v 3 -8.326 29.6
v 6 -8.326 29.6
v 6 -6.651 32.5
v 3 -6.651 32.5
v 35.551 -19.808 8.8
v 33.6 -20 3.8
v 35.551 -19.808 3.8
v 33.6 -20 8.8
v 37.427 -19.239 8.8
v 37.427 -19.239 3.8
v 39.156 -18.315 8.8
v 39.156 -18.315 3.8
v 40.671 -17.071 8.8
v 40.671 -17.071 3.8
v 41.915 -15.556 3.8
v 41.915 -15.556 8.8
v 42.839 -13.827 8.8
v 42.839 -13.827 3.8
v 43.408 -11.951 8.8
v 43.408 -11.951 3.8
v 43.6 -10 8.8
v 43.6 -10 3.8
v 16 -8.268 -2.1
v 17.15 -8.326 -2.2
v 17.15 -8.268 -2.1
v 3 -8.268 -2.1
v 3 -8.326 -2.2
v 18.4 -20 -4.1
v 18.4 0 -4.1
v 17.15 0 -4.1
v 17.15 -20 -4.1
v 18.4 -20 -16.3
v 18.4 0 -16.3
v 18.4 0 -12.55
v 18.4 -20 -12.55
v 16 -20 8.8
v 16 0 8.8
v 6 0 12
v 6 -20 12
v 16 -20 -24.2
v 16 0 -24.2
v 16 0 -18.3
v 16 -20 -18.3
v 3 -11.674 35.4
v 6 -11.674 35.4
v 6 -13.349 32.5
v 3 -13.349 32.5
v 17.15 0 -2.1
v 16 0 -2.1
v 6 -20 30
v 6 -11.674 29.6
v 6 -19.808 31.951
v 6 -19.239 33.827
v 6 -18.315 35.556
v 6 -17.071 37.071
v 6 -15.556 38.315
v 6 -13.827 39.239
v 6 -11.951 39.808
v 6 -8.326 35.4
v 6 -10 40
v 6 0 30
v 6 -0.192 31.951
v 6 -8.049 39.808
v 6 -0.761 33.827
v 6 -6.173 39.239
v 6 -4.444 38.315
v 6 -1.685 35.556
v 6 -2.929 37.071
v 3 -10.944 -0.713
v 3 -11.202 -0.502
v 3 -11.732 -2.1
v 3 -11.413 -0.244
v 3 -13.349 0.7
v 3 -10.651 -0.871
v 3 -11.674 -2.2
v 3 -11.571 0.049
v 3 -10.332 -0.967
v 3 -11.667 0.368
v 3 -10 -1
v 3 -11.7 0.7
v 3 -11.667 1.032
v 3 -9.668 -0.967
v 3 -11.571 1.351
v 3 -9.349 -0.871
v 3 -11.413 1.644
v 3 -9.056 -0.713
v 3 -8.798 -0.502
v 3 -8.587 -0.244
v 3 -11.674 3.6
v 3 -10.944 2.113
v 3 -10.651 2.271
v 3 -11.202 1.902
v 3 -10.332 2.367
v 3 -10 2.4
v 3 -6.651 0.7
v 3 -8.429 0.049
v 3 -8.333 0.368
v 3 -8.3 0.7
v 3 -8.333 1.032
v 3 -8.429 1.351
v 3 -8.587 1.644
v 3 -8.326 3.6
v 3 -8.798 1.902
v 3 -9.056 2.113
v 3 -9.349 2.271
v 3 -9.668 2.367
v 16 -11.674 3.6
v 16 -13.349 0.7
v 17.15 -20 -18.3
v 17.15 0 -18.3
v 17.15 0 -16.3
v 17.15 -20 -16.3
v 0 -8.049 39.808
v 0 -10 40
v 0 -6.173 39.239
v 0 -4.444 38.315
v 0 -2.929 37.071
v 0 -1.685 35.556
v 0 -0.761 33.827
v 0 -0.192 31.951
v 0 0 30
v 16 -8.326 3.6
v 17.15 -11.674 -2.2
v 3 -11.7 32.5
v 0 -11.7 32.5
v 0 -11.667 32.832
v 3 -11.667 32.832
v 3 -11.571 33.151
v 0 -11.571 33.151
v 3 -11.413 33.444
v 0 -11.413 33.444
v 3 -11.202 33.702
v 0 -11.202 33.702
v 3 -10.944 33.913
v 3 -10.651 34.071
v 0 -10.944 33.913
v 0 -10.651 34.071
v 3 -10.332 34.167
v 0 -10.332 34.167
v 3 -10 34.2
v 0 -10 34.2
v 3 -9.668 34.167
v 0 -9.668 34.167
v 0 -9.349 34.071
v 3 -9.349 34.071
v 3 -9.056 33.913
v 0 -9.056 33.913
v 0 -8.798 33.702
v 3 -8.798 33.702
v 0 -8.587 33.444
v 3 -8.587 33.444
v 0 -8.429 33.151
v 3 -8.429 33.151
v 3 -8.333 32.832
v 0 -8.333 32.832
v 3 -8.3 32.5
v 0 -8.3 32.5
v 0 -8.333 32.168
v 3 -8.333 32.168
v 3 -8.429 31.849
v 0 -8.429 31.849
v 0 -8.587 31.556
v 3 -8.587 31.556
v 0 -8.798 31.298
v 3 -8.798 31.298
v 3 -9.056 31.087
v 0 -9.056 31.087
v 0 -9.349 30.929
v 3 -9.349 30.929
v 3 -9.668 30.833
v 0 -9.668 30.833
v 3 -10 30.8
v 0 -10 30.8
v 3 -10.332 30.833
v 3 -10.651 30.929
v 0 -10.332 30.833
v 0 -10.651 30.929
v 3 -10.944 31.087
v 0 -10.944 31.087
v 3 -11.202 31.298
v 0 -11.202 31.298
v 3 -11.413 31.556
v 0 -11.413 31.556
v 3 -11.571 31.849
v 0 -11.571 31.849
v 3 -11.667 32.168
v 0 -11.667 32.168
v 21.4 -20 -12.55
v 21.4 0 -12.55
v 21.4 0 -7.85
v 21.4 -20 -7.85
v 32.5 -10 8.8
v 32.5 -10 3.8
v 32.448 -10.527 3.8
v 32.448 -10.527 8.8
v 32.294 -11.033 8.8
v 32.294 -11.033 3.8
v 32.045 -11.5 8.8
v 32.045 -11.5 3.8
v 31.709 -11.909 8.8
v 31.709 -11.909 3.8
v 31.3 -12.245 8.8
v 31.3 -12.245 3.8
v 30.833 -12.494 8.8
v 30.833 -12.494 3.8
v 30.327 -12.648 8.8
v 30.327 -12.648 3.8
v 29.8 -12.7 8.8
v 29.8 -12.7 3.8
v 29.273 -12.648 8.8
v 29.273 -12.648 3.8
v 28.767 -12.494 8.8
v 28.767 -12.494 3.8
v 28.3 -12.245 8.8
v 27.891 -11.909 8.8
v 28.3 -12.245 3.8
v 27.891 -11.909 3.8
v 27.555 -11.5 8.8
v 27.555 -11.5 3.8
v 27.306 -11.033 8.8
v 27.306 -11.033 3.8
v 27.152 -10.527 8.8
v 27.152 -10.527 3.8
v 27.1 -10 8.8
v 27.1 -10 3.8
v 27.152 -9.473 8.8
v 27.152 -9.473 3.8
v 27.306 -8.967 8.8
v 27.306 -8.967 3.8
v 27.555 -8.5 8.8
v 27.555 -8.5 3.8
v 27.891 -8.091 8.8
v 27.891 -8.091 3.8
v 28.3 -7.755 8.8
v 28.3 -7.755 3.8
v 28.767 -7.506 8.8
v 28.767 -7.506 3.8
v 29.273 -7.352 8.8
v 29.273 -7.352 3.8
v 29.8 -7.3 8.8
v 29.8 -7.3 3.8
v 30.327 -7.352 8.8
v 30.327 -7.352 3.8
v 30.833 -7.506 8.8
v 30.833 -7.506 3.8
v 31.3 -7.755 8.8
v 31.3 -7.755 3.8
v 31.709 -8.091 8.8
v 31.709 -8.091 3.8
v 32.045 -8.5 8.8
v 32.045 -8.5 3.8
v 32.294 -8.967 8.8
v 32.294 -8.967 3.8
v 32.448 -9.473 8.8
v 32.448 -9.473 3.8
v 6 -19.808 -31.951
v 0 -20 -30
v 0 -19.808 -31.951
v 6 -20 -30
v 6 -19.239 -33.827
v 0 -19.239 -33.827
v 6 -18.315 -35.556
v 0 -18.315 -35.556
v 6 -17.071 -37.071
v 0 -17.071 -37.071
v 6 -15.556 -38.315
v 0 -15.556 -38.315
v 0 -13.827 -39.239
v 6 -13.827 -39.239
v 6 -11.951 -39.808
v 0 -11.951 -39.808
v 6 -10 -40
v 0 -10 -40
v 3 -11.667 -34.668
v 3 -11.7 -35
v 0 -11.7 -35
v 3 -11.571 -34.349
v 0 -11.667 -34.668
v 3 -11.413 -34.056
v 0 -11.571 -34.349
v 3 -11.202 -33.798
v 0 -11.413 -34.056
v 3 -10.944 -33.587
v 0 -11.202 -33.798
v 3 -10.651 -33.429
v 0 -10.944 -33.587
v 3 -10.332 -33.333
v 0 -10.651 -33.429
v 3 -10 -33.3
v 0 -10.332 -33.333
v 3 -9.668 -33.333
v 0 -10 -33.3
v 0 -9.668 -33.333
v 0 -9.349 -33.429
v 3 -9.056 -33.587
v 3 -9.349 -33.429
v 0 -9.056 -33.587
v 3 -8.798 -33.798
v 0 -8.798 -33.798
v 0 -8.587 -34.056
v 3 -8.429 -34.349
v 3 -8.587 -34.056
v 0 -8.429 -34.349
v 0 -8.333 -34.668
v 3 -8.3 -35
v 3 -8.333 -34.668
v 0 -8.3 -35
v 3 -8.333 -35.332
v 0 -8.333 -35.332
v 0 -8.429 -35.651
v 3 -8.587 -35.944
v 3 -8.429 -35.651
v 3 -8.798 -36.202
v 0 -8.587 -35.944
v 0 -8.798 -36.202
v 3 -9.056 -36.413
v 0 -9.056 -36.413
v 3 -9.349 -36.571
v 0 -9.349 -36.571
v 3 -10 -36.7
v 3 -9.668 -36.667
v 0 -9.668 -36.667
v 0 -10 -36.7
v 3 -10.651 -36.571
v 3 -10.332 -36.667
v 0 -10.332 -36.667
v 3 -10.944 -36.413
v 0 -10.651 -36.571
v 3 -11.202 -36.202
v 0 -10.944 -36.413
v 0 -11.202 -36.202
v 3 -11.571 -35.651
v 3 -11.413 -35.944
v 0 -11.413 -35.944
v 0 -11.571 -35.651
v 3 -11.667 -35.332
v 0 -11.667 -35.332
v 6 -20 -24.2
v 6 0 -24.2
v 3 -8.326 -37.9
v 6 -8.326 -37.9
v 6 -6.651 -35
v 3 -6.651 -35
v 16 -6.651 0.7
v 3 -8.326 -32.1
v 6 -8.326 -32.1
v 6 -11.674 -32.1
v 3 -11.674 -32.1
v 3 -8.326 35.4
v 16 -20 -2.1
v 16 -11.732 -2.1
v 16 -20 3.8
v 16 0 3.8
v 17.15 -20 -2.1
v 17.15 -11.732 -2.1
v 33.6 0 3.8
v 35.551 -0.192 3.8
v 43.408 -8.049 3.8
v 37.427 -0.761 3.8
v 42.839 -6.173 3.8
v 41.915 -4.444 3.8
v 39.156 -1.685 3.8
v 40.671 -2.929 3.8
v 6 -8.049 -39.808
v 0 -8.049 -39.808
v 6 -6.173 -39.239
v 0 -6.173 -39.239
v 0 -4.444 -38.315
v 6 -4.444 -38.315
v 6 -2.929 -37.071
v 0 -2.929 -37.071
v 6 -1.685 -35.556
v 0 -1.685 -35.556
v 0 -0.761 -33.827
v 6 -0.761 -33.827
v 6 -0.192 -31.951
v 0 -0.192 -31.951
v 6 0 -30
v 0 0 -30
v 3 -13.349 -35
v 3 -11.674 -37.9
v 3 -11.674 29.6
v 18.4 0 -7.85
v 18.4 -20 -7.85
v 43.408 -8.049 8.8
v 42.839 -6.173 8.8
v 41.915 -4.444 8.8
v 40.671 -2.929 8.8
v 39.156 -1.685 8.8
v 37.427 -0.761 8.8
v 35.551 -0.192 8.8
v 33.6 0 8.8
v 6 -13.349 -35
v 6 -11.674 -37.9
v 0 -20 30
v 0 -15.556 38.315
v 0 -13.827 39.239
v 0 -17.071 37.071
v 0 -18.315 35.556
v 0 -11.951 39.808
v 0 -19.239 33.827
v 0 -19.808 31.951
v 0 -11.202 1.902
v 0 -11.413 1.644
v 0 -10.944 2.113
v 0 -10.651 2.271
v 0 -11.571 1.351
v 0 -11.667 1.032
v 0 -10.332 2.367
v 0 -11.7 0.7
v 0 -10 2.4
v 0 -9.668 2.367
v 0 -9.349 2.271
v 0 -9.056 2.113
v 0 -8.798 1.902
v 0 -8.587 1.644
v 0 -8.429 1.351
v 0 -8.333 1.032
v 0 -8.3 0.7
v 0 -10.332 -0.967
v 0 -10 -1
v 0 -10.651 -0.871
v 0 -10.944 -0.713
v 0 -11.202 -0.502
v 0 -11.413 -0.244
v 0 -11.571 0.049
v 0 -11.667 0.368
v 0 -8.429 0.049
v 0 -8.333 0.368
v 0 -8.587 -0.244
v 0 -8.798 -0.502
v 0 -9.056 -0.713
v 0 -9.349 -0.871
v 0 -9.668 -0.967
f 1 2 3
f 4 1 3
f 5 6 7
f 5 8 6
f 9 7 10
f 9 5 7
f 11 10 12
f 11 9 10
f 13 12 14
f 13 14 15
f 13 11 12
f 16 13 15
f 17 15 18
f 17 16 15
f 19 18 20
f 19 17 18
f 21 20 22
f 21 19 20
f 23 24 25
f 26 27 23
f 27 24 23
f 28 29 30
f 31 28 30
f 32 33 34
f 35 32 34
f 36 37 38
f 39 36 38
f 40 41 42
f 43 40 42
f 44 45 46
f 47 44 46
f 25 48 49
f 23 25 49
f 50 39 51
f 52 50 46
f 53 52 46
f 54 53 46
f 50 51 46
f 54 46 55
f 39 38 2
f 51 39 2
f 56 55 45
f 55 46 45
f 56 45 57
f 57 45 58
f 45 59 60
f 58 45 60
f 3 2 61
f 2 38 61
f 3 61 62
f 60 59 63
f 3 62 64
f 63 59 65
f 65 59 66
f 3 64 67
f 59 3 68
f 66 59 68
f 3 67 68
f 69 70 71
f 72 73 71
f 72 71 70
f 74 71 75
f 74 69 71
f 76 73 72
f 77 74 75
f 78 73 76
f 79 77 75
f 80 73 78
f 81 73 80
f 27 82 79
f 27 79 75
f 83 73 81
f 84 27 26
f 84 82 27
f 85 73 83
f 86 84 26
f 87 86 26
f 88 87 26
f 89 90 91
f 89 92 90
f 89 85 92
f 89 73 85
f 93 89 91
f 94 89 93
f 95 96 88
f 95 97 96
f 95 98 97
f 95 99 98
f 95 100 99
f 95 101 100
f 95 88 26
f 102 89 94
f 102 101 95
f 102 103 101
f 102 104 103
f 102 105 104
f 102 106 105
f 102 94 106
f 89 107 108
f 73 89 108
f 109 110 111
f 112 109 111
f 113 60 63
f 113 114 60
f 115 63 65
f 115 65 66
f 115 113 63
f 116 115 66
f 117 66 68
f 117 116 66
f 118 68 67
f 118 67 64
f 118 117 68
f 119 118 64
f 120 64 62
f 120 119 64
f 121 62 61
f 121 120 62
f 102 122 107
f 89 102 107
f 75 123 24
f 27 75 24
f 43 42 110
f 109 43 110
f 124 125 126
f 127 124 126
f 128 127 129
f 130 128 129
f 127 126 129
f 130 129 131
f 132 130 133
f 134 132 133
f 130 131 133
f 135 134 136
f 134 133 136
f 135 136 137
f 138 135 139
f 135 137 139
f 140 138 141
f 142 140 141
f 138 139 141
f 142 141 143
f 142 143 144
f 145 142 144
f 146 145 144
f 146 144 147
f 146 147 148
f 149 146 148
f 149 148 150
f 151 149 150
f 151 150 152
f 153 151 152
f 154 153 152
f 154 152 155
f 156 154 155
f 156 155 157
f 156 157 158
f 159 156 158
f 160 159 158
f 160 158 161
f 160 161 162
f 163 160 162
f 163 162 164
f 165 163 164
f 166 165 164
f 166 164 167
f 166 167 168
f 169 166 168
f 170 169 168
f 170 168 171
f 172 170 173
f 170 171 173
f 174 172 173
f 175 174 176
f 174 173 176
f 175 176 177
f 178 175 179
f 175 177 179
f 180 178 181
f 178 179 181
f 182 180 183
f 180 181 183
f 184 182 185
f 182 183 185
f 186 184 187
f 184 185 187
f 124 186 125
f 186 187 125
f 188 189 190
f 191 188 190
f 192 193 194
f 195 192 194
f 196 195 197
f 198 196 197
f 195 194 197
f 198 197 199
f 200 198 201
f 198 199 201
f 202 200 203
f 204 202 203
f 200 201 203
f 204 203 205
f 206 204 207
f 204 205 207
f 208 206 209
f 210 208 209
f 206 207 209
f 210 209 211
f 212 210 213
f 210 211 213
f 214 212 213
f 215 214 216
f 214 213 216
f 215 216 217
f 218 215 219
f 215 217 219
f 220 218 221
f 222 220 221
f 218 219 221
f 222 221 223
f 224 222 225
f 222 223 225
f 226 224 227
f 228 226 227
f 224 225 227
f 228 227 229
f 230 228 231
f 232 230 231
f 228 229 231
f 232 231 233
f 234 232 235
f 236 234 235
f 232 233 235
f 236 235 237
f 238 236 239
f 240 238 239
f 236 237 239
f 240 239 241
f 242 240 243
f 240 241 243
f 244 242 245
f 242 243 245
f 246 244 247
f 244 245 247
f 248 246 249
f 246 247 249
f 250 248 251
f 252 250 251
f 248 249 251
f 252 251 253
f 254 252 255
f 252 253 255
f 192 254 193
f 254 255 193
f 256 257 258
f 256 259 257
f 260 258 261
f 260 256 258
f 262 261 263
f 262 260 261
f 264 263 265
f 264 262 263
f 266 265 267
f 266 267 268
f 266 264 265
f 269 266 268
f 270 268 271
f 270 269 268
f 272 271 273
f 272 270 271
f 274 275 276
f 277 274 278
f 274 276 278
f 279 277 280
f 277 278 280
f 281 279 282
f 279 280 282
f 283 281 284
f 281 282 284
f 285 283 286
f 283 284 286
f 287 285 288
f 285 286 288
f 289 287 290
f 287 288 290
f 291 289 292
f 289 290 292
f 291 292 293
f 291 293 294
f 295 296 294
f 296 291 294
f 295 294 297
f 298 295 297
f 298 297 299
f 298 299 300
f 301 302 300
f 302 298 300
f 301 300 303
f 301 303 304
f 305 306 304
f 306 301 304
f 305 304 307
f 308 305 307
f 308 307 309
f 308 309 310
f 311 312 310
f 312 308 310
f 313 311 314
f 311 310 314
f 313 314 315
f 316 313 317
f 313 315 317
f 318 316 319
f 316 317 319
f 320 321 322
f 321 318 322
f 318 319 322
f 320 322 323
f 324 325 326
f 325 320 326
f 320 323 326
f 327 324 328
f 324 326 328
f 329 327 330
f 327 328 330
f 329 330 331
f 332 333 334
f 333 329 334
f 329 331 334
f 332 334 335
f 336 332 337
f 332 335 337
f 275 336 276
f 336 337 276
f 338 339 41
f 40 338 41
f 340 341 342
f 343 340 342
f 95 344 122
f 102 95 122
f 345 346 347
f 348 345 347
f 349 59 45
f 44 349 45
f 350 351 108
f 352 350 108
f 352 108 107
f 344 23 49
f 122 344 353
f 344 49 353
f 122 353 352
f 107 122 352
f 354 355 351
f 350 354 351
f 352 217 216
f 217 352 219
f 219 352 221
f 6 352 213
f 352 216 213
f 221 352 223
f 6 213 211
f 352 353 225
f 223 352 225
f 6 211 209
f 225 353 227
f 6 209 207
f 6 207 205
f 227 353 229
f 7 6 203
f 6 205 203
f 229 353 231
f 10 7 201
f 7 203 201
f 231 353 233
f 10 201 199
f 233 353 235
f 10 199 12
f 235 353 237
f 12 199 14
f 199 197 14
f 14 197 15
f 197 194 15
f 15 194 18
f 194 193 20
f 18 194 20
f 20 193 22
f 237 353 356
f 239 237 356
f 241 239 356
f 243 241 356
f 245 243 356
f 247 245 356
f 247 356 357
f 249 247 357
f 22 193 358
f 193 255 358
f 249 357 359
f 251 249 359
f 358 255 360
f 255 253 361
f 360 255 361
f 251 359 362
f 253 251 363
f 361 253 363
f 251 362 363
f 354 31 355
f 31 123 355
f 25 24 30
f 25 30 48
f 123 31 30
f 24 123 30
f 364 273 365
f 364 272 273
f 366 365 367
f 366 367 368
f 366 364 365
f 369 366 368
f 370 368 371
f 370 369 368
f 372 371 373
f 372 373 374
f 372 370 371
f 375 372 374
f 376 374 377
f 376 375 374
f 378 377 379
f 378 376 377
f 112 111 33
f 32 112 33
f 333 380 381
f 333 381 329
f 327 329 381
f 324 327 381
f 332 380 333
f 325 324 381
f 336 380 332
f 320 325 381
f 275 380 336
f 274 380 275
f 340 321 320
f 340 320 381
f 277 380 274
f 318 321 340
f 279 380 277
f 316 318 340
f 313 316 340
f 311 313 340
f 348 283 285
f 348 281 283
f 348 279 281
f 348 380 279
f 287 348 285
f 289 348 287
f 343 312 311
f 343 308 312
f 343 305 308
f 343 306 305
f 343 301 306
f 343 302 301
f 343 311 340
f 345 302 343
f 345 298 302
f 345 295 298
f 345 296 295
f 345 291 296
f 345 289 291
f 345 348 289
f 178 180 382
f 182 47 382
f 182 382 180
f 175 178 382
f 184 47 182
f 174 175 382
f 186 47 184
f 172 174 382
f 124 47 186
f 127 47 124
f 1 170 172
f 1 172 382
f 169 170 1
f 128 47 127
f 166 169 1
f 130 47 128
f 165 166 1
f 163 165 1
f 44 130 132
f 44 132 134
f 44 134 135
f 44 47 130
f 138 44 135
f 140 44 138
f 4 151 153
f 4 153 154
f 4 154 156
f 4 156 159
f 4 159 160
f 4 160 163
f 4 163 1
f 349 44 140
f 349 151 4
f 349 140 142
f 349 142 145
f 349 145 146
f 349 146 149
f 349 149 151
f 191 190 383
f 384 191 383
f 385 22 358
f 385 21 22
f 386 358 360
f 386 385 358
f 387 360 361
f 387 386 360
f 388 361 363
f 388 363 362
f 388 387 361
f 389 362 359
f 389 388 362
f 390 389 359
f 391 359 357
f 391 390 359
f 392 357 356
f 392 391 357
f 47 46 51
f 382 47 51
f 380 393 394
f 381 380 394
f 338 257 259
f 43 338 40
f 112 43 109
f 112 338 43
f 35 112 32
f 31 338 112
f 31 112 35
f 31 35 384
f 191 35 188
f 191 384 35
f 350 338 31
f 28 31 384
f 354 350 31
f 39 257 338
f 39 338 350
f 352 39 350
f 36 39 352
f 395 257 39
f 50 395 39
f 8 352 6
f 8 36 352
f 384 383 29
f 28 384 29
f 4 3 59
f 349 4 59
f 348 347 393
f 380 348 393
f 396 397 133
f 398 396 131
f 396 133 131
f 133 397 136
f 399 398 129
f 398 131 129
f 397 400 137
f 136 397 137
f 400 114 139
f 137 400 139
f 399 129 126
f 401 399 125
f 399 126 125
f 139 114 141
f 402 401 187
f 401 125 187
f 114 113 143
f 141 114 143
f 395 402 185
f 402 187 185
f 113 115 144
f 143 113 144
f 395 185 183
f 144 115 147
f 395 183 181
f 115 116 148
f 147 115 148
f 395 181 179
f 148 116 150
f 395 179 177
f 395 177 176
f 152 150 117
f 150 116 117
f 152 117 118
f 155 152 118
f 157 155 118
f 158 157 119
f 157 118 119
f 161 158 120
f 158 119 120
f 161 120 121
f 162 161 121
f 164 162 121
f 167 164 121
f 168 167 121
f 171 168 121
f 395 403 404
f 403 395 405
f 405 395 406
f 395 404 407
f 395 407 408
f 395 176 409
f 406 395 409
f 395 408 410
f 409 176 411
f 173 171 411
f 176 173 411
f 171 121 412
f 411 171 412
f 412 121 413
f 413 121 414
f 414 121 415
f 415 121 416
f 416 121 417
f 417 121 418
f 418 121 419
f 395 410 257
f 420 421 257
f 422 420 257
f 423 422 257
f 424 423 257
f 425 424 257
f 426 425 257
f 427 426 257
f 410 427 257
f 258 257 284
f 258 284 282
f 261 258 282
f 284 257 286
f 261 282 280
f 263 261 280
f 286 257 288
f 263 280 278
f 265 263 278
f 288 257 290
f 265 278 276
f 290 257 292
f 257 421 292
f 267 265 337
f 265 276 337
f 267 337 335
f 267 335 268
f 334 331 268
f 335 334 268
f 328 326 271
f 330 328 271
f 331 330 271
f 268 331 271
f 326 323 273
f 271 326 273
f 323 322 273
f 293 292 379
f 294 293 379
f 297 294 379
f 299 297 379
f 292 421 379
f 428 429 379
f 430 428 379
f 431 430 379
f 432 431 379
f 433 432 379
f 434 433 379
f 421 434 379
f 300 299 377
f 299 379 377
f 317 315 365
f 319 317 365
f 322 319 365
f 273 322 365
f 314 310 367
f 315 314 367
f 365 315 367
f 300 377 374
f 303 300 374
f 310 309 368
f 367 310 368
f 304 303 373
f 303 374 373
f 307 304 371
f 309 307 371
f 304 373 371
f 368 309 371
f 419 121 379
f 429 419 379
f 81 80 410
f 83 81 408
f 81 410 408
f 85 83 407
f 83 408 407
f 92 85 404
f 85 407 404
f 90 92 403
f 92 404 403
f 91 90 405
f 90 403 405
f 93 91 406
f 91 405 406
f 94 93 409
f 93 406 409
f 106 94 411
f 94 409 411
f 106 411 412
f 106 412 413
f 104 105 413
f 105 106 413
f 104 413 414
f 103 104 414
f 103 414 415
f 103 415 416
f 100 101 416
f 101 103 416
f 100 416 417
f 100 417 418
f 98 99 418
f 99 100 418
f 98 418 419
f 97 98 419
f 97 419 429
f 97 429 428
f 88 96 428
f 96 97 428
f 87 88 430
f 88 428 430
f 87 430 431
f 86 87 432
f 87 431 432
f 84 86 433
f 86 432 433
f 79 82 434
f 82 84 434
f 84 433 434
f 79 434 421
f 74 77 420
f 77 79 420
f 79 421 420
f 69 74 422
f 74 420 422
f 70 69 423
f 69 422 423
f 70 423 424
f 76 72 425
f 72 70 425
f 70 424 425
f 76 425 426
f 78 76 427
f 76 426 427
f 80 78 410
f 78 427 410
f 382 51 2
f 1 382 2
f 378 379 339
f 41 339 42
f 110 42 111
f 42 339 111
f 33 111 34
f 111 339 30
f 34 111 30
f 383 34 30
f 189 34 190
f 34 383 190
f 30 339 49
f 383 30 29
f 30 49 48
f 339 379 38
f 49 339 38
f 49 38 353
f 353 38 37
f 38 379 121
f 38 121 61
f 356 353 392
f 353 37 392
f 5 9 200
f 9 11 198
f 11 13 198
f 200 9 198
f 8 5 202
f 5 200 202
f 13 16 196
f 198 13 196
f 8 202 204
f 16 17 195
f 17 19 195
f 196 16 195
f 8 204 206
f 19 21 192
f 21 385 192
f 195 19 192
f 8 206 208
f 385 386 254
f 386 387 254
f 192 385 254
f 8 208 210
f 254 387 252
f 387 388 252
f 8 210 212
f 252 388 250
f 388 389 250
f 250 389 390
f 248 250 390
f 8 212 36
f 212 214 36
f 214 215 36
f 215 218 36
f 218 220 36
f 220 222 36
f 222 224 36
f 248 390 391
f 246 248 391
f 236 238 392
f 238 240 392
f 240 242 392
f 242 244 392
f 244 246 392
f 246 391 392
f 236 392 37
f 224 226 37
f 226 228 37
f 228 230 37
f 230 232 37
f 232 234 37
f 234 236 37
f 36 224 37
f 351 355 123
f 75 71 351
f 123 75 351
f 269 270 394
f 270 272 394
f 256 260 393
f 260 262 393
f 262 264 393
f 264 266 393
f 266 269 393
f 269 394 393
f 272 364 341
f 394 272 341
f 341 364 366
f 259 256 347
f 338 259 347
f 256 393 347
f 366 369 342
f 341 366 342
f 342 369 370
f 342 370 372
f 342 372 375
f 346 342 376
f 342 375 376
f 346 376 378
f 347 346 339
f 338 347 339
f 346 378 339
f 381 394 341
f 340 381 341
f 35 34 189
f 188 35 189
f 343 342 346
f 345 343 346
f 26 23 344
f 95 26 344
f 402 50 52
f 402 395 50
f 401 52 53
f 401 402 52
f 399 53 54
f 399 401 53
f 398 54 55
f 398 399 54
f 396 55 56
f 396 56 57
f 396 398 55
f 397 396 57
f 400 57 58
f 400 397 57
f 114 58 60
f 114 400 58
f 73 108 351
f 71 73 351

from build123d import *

# Parameters (mm, degrees)
F1_DEPTH       = 20
F2_R           = 2.7
F3_DEPTH       = 5
F4_R           = 1.7
F5_DEPTH       = 16.001
F6_R           = 1.7
F7_R           = 1.7
F9_DEPTH       = 3
F8_R           = 1.7
F10_DEPTH      = 5.4
F10_DEPTH_BACK = 13
F11_R          = 9.99999


# Not quite as in the source:
# - a fillet or chamfer is up to 0.001 mm smaller than in the source, because OpenCascade refuses the exact size


with BuildPart() as f1:
    # F0 (on Front) → F1 (new body)
    with BuildSketch(Plane.XZ):
        Polygon((16, 8.8), (6, 12), (6, 40), (0, 40), (0, -40), (6, -40), (6, -24.2), (16, -24.2), (16, -18.3), (17.15, -18.3), (17.15, -16.3), (18.4, -16.3), (18.4, -12.55), (21.4, -12.55), (21.4, -7.85), (18.4, -7.85), (18.4, -4.1), (17.15, -4.1), (17.15, -2.1), (16, -2.1), (16, 3.8), (43.6, 3.8), (43.6, 8.8), align=None)
    extrude(amount=F1_DEPTH)

    # F2 (on face) → F3 (cut, through all)
    with BuildSketch(Plane(origin=(0, 0, 3.8), x_dir=(1, 0, 0), z_dir=(0, 0, -1))):
        with Locations((29.8, 10)):
            Circle(F2_R)
    extrude(amount=-F3_DEPTH, mode=Mode.SUBTRACT)

    # F4 (on face) → F5 (cut, through all)
    with BuildSketch(Plane(origin=(0, 0, 0), x_dir=(0, -1, 0), z_dir=(-1, 0, 0))):
        with Locations((10, 32.5)):
            Circle(F4_R)
        with Locations((10, 0.7)):
            Circle(F4_R)
        with Locations((10, -35)):
            Circle(F4_R)
    extrude(amount=-F5_DEPTH, mode=Mode.SUBTRACT)

    # F6 (on face) + F7 (on face) → F9 (cut)
    with BuildSketch(Plane.YZ.offset(6)):
        Polygon((-13.3486315613, 32.5), (-11.6743157806, 29.6), (-8.3256842194, 29.6), (-6.6513684387, 32.5), (-8.3256842194, 35.4), (-11.6743157806, 35.4), align=None)
        with Locations((-10, 32.5)):
            Circle(F6_R, mode=Mode.SUBTRACT)
        with Locations((-10, 32.5)):
            Circle(F6_R)
    with BuildSketch(Plane.YZ.offset(6)):
        Polygon((-8.3256842194, -37.8999999998), (-6.6513684387, -34.9999999998), (-8.3256842194, -32.0999999998), (-11.6743157806, -32.0999999998), (-13.3486315613, -34.9999999998), (-11.6743157806, -37.8999999998), align=None)
        with Locations((-10, -35)):
            Circle(F7_R, mode=Mode.SUBTRACT)
    extrude(amount=-F9_DEPTH, mode=Mode.SUBTRACT)

    # F8 (on face) → F10 (cut, two sides)
    with BuildSketch(Plane.YZ.offset(16)) as f10_sk:
        Polygon((-13.3486315613, 0.7), (-11.7320508076, -2.1), (-8.2679491924, -2.1), (-6.6513684387, 0.7), (-8.3256842194, 3.6), (-11.6743157806, 3.6), align=None)
        with Locations((-10, 0.7)):
            Circle(F8_R, mode=Mode.SUBTRACT)
        Polygon((-11.7320508076, -2.1), (-11.6743157806, -2.2), (-8.3256842194, -2.2), (-8.2679491924, -2.1), align=None)
    extrude(amount=F10_DEPTH, mode=Mode.SUBTRACT)
    extrude(f10_sk.sketch, amount=-F10_DEPTH_BACK, mode=Mode.SUBTRACT)

    # F11 (radius 10 in the source; OpenCascade refuses exactly that, so slightly less here)
    f11_edges = [f1.edges().sort_by_distance(p)[0] for p in [
        (3, -20, 40),
        (3, 0, 40),
        (3, -20, -40),
        (3, 0, -40),
        (43.6, 0, 6.3),
        (43.6, -20, 6.3),
    ]]
    fillet(f11_edges, radius=F11_R)


solid = f1.part
